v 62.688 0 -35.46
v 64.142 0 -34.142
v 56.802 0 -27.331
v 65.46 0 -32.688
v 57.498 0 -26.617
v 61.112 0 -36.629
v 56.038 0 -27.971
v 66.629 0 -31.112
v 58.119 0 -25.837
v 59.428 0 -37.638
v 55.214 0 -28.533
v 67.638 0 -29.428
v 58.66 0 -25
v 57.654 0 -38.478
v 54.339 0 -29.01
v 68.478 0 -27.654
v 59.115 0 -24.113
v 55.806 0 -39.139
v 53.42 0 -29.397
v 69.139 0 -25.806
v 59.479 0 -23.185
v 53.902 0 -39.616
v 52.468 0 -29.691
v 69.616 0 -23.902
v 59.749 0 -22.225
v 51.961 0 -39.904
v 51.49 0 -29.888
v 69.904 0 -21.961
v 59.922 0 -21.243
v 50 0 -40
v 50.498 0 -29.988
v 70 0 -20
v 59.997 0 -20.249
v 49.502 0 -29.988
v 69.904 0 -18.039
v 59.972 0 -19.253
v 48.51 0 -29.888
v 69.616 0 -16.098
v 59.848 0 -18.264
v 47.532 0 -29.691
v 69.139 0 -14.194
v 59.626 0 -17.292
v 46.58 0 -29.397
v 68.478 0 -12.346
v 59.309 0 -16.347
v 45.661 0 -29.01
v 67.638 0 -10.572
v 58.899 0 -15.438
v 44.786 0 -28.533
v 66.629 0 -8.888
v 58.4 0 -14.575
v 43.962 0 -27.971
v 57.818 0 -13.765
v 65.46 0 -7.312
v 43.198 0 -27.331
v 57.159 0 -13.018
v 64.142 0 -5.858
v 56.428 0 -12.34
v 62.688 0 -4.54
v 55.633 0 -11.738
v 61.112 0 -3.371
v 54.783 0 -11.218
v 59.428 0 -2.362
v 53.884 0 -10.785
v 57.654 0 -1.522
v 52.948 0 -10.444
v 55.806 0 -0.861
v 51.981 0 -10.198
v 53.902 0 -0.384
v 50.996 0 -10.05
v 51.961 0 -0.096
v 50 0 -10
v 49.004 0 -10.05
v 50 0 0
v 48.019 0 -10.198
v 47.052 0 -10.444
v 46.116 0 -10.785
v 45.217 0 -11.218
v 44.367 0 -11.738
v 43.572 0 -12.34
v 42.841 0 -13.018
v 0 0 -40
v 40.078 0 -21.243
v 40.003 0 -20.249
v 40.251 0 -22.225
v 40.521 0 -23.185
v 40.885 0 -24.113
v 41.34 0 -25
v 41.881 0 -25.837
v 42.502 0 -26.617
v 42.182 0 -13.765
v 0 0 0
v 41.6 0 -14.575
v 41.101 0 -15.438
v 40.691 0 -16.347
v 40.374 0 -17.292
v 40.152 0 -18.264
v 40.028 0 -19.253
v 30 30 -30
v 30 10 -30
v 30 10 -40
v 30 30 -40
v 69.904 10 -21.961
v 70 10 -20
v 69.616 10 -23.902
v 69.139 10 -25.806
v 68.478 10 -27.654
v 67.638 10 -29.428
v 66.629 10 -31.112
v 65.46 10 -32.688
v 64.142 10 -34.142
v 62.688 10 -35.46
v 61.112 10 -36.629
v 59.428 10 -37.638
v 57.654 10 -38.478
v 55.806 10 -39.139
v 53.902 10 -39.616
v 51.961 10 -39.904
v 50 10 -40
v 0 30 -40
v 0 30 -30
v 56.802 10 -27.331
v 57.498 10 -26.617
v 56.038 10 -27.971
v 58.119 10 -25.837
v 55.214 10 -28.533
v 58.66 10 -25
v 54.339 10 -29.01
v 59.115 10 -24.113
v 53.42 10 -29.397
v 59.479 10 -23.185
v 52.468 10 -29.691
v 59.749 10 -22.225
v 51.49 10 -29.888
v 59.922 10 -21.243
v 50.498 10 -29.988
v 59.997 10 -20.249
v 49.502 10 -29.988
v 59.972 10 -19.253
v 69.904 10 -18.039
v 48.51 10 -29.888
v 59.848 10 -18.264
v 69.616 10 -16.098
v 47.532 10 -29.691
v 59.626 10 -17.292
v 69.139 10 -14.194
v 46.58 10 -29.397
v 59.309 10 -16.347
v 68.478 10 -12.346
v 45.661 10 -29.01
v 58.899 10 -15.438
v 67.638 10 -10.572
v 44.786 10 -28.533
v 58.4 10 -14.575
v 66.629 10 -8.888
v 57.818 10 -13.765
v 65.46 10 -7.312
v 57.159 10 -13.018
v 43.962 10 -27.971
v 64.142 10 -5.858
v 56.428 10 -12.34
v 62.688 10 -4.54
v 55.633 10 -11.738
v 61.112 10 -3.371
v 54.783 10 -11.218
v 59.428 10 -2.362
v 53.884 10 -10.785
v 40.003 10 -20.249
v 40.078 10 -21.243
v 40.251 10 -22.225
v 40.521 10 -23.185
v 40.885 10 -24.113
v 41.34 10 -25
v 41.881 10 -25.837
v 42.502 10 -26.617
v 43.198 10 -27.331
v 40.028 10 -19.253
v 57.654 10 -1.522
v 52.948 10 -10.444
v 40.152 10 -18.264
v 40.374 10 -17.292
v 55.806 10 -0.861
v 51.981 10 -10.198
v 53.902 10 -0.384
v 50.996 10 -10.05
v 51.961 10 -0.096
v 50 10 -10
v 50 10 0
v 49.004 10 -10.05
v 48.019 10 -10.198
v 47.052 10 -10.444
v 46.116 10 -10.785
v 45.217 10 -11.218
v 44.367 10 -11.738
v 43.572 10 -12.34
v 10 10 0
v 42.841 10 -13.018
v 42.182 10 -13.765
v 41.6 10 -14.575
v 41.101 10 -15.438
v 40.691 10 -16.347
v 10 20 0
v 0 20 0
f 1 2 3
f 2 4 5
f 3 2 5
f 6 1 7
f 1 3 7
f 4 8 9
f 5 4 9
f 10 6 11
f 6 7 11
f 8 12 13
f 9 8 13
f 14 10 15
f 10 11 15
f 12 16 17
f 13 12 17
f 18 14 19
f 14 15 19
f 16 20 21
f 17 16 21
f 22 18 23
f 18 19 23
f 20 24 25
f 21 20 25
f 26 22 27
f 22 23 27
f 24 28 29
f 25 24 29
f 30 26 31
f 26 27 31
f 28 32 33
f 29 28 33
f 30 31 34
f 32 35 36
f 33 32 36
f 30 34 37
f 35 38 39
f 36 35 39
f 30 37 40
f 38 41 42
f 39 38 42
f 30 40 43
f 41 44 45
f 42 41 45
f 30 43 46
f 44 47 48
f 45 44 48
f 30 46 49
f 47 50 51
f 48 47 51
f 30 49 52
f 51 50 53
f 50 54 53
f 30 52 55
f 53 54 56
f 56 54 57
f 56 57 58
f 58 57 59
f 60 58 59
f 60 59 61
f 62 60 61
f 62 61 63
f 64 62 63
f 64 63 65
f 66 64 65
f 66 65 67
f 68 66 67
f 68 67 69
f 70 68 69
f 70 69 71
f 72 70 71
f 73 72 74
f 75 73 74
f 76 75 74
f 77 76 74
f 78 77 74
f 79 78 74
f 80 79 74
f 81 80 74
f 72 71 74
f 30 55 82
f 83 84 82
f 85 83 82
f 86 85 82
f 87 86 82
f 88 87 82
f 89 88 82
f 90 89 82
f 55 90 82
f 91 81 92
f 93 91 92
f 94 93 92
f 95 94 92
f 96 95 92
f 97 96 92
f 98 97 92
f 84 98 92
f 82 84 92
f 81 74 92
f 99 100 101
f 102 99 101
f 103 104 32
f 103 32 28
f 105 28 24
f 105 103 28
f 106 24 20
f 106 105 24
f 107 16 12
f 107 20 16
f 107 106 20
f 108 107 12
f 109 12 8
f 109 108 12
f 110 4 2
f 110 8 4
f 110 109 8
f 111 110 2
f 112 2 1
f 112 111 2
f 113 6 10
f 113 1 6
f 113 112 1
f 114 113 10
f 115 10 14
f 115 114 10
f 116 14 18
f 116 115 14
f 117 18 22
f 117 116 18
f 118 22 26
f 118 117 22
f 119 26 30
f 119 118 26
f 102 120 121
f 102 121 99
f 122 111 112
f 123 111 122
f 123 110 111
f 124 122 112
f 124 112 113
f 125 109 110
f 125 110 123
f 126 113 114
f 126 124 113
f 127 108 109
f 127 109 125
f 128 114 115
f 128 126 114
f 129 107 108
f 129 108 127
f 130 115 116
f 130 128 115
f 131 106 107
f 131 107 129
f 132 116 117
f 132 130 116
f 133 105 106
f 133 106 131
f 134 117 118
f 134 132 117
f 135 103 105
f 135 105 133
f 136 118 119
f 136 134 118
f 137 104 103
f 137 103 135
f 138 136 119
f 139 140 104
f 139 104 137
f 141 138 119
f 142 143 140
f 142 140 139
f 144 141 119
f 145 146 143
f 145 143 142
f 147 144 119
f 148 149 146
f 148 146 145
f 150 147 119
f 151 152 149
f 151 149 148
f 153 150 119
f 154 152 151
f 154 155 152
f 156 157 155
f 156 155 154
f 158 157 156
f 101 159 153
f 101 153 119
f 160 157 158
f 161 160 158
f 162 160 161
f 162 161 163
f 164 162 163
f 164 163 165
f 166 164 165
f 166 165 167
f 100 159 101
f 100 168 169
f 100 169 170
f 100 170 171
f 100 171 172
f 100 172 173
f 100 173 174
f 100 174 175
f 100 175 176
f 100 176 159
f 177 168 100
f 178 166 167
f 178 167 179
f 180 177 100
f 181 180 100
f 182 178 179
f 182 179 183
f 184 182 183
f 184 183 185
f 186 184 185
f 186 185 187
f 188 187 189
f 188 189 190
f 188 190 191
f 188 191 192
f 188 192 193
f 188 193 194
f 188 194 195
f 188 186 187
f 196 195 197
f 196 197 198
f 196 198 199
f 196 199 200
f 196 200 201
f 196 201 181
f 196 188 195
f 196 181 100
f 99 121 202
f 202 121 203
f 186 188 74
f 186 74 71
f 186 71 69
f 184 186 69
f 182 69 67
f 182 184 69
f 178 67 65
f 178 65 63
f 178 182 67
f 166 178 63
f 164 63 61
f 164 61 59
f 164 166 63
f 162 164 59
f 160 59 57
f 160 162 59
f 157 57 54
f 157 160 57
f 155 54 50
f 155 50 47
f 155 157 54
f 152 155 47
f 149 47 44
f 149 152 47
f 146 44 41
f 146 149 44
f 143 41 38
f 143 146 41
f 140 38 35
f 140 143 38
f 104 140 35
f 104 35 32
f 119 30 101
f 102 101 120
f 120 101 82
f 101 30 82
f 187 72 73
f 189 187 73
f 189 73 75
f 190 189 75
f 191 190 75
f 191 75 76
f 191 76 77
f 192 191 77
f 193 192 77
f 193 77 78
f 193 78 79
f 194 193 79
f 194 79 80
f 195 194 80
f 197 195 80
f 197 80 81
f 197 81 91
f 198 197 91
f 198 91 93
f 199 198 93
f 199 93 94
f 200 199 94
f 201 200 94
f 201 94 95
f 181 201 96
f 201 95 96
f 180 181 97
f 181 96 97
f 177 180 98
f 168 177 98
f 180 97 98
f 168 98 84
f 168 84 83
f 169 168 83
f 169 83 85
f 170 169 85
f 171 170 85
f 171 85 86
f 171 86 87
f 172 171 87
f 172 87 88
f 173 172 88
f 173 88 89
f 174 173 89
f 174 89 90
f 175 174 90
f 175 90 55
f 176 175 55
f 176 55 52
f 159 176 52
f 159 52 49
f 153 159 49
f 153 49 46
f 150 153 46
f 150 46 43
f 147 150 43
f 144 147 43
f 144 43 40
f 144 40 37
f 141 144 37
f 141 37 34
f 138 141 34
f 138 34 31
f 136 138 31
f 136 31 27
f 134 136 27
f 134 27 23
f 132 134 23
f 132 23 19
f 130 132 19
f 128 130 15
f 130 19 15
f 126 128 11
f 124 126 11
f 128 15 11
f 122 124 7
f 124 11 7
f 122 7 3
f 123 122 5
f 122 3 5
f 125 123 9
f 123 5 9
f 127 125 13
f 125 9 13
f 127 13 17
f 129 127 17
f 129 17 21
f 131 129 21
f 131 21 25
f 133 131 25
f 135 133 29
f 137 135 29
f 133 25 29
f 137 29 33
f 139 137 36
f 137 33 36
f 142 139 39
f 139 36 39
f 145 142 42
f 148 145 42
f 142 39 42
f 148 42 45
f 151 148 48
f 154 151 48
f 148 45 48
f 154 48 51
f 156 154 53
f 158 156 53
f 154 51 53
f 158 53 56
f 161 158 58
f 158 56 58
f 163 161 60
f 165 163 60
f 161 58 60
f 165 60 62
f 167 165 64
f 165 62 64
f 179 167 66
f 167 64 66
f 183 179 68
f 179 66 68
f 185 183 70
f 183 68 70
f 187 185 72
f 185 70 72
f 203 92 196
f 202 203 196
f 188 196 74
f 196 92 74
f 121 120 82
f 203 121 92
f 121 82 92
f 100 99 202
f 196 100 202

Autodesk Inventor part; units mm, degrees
ref_plane "YZ Plane" through (0, 0, 0) normal (1, 0, 0) x (0, 1, 0)
ref_plane "XZ Plane" through (0, 0, 0) normal (0, 1, 0) x (-1, 0, 0)
ref_plane "XY Plane" through (0, 0, 0) normal (0, 0, 1) x (1, 0, 0)
sketch "草圖1" plane through (0, 0, 0) normal (0, 1, 0) x (-1, 0, 0)
  line L0 (0, 0) -> (-70, 0)
  line L1 (-70, 0) -> (-70, -40)
  line L2 (-70, -40) -> (0, -40)
  line L3 (0, -40) -> (0, 0)
  dimension "d0" = 40
  dimension "d1" = 70
extrude "擠出1" add sketch "草圖1" along normal blind 10
sketch "草圖2" plane through (0, 10, 0) normal (0, 1, 0) x (1, 0, 0)
  line L0 (0, 0) -> (70, 0) projected
  line L1 (70, 40) -> (0, 40) projected
  line L2 (0, 0) -> (30, 0)
  line L3 (30, 0) -> (30, 40)
  line L4 (30, 40) -> (0, 40)
  line L5 (0, 40) -> (0, 0)
  dimension "d4" = 30
extrude "擠出2" add sketch "草圖2" along normal blind 20
sketch "草圖3" plane through (0, 30, 0) normal (0, 1, 0) x (1, 0, 0)
  line L0 (30, 30) -> (10, 0)
  line L1 (0, 0) -> (70, 0) projected
  line L2 (30, 0) -> (30, 30)
  line L3 (30, 0) -> (30, 40) projected
  line L4 (30, 0) -> (10, 0)
  dimension "d7" = 20
  dimension "d8" = 30
extrude "擠出3" cut sketch "草圖3" against normal blind 20
sketch "草圖4" plane through (0, 0, -40) normal (-1, 0, 0) x (0, 0, 1)
  line L0 (-20, 30) -> (40, 30)
  line L1 (10, 30) -> (40, 20)
  line L2 (40, 0) -> (40, 30) projected
  dimension "d11" = 10
  dimension "d12" = 30
extrude "擠出4" cut sketch "草圖4" against normal through all
fillet "圓角1" radius 20 2 edges at (70, 5, 0) (70, 5, -40)
hole "孔1" at (50, 10, -20) direction (0, -1, 0) diameter 20 depth 10 tip angle 118
properties part number "27"
